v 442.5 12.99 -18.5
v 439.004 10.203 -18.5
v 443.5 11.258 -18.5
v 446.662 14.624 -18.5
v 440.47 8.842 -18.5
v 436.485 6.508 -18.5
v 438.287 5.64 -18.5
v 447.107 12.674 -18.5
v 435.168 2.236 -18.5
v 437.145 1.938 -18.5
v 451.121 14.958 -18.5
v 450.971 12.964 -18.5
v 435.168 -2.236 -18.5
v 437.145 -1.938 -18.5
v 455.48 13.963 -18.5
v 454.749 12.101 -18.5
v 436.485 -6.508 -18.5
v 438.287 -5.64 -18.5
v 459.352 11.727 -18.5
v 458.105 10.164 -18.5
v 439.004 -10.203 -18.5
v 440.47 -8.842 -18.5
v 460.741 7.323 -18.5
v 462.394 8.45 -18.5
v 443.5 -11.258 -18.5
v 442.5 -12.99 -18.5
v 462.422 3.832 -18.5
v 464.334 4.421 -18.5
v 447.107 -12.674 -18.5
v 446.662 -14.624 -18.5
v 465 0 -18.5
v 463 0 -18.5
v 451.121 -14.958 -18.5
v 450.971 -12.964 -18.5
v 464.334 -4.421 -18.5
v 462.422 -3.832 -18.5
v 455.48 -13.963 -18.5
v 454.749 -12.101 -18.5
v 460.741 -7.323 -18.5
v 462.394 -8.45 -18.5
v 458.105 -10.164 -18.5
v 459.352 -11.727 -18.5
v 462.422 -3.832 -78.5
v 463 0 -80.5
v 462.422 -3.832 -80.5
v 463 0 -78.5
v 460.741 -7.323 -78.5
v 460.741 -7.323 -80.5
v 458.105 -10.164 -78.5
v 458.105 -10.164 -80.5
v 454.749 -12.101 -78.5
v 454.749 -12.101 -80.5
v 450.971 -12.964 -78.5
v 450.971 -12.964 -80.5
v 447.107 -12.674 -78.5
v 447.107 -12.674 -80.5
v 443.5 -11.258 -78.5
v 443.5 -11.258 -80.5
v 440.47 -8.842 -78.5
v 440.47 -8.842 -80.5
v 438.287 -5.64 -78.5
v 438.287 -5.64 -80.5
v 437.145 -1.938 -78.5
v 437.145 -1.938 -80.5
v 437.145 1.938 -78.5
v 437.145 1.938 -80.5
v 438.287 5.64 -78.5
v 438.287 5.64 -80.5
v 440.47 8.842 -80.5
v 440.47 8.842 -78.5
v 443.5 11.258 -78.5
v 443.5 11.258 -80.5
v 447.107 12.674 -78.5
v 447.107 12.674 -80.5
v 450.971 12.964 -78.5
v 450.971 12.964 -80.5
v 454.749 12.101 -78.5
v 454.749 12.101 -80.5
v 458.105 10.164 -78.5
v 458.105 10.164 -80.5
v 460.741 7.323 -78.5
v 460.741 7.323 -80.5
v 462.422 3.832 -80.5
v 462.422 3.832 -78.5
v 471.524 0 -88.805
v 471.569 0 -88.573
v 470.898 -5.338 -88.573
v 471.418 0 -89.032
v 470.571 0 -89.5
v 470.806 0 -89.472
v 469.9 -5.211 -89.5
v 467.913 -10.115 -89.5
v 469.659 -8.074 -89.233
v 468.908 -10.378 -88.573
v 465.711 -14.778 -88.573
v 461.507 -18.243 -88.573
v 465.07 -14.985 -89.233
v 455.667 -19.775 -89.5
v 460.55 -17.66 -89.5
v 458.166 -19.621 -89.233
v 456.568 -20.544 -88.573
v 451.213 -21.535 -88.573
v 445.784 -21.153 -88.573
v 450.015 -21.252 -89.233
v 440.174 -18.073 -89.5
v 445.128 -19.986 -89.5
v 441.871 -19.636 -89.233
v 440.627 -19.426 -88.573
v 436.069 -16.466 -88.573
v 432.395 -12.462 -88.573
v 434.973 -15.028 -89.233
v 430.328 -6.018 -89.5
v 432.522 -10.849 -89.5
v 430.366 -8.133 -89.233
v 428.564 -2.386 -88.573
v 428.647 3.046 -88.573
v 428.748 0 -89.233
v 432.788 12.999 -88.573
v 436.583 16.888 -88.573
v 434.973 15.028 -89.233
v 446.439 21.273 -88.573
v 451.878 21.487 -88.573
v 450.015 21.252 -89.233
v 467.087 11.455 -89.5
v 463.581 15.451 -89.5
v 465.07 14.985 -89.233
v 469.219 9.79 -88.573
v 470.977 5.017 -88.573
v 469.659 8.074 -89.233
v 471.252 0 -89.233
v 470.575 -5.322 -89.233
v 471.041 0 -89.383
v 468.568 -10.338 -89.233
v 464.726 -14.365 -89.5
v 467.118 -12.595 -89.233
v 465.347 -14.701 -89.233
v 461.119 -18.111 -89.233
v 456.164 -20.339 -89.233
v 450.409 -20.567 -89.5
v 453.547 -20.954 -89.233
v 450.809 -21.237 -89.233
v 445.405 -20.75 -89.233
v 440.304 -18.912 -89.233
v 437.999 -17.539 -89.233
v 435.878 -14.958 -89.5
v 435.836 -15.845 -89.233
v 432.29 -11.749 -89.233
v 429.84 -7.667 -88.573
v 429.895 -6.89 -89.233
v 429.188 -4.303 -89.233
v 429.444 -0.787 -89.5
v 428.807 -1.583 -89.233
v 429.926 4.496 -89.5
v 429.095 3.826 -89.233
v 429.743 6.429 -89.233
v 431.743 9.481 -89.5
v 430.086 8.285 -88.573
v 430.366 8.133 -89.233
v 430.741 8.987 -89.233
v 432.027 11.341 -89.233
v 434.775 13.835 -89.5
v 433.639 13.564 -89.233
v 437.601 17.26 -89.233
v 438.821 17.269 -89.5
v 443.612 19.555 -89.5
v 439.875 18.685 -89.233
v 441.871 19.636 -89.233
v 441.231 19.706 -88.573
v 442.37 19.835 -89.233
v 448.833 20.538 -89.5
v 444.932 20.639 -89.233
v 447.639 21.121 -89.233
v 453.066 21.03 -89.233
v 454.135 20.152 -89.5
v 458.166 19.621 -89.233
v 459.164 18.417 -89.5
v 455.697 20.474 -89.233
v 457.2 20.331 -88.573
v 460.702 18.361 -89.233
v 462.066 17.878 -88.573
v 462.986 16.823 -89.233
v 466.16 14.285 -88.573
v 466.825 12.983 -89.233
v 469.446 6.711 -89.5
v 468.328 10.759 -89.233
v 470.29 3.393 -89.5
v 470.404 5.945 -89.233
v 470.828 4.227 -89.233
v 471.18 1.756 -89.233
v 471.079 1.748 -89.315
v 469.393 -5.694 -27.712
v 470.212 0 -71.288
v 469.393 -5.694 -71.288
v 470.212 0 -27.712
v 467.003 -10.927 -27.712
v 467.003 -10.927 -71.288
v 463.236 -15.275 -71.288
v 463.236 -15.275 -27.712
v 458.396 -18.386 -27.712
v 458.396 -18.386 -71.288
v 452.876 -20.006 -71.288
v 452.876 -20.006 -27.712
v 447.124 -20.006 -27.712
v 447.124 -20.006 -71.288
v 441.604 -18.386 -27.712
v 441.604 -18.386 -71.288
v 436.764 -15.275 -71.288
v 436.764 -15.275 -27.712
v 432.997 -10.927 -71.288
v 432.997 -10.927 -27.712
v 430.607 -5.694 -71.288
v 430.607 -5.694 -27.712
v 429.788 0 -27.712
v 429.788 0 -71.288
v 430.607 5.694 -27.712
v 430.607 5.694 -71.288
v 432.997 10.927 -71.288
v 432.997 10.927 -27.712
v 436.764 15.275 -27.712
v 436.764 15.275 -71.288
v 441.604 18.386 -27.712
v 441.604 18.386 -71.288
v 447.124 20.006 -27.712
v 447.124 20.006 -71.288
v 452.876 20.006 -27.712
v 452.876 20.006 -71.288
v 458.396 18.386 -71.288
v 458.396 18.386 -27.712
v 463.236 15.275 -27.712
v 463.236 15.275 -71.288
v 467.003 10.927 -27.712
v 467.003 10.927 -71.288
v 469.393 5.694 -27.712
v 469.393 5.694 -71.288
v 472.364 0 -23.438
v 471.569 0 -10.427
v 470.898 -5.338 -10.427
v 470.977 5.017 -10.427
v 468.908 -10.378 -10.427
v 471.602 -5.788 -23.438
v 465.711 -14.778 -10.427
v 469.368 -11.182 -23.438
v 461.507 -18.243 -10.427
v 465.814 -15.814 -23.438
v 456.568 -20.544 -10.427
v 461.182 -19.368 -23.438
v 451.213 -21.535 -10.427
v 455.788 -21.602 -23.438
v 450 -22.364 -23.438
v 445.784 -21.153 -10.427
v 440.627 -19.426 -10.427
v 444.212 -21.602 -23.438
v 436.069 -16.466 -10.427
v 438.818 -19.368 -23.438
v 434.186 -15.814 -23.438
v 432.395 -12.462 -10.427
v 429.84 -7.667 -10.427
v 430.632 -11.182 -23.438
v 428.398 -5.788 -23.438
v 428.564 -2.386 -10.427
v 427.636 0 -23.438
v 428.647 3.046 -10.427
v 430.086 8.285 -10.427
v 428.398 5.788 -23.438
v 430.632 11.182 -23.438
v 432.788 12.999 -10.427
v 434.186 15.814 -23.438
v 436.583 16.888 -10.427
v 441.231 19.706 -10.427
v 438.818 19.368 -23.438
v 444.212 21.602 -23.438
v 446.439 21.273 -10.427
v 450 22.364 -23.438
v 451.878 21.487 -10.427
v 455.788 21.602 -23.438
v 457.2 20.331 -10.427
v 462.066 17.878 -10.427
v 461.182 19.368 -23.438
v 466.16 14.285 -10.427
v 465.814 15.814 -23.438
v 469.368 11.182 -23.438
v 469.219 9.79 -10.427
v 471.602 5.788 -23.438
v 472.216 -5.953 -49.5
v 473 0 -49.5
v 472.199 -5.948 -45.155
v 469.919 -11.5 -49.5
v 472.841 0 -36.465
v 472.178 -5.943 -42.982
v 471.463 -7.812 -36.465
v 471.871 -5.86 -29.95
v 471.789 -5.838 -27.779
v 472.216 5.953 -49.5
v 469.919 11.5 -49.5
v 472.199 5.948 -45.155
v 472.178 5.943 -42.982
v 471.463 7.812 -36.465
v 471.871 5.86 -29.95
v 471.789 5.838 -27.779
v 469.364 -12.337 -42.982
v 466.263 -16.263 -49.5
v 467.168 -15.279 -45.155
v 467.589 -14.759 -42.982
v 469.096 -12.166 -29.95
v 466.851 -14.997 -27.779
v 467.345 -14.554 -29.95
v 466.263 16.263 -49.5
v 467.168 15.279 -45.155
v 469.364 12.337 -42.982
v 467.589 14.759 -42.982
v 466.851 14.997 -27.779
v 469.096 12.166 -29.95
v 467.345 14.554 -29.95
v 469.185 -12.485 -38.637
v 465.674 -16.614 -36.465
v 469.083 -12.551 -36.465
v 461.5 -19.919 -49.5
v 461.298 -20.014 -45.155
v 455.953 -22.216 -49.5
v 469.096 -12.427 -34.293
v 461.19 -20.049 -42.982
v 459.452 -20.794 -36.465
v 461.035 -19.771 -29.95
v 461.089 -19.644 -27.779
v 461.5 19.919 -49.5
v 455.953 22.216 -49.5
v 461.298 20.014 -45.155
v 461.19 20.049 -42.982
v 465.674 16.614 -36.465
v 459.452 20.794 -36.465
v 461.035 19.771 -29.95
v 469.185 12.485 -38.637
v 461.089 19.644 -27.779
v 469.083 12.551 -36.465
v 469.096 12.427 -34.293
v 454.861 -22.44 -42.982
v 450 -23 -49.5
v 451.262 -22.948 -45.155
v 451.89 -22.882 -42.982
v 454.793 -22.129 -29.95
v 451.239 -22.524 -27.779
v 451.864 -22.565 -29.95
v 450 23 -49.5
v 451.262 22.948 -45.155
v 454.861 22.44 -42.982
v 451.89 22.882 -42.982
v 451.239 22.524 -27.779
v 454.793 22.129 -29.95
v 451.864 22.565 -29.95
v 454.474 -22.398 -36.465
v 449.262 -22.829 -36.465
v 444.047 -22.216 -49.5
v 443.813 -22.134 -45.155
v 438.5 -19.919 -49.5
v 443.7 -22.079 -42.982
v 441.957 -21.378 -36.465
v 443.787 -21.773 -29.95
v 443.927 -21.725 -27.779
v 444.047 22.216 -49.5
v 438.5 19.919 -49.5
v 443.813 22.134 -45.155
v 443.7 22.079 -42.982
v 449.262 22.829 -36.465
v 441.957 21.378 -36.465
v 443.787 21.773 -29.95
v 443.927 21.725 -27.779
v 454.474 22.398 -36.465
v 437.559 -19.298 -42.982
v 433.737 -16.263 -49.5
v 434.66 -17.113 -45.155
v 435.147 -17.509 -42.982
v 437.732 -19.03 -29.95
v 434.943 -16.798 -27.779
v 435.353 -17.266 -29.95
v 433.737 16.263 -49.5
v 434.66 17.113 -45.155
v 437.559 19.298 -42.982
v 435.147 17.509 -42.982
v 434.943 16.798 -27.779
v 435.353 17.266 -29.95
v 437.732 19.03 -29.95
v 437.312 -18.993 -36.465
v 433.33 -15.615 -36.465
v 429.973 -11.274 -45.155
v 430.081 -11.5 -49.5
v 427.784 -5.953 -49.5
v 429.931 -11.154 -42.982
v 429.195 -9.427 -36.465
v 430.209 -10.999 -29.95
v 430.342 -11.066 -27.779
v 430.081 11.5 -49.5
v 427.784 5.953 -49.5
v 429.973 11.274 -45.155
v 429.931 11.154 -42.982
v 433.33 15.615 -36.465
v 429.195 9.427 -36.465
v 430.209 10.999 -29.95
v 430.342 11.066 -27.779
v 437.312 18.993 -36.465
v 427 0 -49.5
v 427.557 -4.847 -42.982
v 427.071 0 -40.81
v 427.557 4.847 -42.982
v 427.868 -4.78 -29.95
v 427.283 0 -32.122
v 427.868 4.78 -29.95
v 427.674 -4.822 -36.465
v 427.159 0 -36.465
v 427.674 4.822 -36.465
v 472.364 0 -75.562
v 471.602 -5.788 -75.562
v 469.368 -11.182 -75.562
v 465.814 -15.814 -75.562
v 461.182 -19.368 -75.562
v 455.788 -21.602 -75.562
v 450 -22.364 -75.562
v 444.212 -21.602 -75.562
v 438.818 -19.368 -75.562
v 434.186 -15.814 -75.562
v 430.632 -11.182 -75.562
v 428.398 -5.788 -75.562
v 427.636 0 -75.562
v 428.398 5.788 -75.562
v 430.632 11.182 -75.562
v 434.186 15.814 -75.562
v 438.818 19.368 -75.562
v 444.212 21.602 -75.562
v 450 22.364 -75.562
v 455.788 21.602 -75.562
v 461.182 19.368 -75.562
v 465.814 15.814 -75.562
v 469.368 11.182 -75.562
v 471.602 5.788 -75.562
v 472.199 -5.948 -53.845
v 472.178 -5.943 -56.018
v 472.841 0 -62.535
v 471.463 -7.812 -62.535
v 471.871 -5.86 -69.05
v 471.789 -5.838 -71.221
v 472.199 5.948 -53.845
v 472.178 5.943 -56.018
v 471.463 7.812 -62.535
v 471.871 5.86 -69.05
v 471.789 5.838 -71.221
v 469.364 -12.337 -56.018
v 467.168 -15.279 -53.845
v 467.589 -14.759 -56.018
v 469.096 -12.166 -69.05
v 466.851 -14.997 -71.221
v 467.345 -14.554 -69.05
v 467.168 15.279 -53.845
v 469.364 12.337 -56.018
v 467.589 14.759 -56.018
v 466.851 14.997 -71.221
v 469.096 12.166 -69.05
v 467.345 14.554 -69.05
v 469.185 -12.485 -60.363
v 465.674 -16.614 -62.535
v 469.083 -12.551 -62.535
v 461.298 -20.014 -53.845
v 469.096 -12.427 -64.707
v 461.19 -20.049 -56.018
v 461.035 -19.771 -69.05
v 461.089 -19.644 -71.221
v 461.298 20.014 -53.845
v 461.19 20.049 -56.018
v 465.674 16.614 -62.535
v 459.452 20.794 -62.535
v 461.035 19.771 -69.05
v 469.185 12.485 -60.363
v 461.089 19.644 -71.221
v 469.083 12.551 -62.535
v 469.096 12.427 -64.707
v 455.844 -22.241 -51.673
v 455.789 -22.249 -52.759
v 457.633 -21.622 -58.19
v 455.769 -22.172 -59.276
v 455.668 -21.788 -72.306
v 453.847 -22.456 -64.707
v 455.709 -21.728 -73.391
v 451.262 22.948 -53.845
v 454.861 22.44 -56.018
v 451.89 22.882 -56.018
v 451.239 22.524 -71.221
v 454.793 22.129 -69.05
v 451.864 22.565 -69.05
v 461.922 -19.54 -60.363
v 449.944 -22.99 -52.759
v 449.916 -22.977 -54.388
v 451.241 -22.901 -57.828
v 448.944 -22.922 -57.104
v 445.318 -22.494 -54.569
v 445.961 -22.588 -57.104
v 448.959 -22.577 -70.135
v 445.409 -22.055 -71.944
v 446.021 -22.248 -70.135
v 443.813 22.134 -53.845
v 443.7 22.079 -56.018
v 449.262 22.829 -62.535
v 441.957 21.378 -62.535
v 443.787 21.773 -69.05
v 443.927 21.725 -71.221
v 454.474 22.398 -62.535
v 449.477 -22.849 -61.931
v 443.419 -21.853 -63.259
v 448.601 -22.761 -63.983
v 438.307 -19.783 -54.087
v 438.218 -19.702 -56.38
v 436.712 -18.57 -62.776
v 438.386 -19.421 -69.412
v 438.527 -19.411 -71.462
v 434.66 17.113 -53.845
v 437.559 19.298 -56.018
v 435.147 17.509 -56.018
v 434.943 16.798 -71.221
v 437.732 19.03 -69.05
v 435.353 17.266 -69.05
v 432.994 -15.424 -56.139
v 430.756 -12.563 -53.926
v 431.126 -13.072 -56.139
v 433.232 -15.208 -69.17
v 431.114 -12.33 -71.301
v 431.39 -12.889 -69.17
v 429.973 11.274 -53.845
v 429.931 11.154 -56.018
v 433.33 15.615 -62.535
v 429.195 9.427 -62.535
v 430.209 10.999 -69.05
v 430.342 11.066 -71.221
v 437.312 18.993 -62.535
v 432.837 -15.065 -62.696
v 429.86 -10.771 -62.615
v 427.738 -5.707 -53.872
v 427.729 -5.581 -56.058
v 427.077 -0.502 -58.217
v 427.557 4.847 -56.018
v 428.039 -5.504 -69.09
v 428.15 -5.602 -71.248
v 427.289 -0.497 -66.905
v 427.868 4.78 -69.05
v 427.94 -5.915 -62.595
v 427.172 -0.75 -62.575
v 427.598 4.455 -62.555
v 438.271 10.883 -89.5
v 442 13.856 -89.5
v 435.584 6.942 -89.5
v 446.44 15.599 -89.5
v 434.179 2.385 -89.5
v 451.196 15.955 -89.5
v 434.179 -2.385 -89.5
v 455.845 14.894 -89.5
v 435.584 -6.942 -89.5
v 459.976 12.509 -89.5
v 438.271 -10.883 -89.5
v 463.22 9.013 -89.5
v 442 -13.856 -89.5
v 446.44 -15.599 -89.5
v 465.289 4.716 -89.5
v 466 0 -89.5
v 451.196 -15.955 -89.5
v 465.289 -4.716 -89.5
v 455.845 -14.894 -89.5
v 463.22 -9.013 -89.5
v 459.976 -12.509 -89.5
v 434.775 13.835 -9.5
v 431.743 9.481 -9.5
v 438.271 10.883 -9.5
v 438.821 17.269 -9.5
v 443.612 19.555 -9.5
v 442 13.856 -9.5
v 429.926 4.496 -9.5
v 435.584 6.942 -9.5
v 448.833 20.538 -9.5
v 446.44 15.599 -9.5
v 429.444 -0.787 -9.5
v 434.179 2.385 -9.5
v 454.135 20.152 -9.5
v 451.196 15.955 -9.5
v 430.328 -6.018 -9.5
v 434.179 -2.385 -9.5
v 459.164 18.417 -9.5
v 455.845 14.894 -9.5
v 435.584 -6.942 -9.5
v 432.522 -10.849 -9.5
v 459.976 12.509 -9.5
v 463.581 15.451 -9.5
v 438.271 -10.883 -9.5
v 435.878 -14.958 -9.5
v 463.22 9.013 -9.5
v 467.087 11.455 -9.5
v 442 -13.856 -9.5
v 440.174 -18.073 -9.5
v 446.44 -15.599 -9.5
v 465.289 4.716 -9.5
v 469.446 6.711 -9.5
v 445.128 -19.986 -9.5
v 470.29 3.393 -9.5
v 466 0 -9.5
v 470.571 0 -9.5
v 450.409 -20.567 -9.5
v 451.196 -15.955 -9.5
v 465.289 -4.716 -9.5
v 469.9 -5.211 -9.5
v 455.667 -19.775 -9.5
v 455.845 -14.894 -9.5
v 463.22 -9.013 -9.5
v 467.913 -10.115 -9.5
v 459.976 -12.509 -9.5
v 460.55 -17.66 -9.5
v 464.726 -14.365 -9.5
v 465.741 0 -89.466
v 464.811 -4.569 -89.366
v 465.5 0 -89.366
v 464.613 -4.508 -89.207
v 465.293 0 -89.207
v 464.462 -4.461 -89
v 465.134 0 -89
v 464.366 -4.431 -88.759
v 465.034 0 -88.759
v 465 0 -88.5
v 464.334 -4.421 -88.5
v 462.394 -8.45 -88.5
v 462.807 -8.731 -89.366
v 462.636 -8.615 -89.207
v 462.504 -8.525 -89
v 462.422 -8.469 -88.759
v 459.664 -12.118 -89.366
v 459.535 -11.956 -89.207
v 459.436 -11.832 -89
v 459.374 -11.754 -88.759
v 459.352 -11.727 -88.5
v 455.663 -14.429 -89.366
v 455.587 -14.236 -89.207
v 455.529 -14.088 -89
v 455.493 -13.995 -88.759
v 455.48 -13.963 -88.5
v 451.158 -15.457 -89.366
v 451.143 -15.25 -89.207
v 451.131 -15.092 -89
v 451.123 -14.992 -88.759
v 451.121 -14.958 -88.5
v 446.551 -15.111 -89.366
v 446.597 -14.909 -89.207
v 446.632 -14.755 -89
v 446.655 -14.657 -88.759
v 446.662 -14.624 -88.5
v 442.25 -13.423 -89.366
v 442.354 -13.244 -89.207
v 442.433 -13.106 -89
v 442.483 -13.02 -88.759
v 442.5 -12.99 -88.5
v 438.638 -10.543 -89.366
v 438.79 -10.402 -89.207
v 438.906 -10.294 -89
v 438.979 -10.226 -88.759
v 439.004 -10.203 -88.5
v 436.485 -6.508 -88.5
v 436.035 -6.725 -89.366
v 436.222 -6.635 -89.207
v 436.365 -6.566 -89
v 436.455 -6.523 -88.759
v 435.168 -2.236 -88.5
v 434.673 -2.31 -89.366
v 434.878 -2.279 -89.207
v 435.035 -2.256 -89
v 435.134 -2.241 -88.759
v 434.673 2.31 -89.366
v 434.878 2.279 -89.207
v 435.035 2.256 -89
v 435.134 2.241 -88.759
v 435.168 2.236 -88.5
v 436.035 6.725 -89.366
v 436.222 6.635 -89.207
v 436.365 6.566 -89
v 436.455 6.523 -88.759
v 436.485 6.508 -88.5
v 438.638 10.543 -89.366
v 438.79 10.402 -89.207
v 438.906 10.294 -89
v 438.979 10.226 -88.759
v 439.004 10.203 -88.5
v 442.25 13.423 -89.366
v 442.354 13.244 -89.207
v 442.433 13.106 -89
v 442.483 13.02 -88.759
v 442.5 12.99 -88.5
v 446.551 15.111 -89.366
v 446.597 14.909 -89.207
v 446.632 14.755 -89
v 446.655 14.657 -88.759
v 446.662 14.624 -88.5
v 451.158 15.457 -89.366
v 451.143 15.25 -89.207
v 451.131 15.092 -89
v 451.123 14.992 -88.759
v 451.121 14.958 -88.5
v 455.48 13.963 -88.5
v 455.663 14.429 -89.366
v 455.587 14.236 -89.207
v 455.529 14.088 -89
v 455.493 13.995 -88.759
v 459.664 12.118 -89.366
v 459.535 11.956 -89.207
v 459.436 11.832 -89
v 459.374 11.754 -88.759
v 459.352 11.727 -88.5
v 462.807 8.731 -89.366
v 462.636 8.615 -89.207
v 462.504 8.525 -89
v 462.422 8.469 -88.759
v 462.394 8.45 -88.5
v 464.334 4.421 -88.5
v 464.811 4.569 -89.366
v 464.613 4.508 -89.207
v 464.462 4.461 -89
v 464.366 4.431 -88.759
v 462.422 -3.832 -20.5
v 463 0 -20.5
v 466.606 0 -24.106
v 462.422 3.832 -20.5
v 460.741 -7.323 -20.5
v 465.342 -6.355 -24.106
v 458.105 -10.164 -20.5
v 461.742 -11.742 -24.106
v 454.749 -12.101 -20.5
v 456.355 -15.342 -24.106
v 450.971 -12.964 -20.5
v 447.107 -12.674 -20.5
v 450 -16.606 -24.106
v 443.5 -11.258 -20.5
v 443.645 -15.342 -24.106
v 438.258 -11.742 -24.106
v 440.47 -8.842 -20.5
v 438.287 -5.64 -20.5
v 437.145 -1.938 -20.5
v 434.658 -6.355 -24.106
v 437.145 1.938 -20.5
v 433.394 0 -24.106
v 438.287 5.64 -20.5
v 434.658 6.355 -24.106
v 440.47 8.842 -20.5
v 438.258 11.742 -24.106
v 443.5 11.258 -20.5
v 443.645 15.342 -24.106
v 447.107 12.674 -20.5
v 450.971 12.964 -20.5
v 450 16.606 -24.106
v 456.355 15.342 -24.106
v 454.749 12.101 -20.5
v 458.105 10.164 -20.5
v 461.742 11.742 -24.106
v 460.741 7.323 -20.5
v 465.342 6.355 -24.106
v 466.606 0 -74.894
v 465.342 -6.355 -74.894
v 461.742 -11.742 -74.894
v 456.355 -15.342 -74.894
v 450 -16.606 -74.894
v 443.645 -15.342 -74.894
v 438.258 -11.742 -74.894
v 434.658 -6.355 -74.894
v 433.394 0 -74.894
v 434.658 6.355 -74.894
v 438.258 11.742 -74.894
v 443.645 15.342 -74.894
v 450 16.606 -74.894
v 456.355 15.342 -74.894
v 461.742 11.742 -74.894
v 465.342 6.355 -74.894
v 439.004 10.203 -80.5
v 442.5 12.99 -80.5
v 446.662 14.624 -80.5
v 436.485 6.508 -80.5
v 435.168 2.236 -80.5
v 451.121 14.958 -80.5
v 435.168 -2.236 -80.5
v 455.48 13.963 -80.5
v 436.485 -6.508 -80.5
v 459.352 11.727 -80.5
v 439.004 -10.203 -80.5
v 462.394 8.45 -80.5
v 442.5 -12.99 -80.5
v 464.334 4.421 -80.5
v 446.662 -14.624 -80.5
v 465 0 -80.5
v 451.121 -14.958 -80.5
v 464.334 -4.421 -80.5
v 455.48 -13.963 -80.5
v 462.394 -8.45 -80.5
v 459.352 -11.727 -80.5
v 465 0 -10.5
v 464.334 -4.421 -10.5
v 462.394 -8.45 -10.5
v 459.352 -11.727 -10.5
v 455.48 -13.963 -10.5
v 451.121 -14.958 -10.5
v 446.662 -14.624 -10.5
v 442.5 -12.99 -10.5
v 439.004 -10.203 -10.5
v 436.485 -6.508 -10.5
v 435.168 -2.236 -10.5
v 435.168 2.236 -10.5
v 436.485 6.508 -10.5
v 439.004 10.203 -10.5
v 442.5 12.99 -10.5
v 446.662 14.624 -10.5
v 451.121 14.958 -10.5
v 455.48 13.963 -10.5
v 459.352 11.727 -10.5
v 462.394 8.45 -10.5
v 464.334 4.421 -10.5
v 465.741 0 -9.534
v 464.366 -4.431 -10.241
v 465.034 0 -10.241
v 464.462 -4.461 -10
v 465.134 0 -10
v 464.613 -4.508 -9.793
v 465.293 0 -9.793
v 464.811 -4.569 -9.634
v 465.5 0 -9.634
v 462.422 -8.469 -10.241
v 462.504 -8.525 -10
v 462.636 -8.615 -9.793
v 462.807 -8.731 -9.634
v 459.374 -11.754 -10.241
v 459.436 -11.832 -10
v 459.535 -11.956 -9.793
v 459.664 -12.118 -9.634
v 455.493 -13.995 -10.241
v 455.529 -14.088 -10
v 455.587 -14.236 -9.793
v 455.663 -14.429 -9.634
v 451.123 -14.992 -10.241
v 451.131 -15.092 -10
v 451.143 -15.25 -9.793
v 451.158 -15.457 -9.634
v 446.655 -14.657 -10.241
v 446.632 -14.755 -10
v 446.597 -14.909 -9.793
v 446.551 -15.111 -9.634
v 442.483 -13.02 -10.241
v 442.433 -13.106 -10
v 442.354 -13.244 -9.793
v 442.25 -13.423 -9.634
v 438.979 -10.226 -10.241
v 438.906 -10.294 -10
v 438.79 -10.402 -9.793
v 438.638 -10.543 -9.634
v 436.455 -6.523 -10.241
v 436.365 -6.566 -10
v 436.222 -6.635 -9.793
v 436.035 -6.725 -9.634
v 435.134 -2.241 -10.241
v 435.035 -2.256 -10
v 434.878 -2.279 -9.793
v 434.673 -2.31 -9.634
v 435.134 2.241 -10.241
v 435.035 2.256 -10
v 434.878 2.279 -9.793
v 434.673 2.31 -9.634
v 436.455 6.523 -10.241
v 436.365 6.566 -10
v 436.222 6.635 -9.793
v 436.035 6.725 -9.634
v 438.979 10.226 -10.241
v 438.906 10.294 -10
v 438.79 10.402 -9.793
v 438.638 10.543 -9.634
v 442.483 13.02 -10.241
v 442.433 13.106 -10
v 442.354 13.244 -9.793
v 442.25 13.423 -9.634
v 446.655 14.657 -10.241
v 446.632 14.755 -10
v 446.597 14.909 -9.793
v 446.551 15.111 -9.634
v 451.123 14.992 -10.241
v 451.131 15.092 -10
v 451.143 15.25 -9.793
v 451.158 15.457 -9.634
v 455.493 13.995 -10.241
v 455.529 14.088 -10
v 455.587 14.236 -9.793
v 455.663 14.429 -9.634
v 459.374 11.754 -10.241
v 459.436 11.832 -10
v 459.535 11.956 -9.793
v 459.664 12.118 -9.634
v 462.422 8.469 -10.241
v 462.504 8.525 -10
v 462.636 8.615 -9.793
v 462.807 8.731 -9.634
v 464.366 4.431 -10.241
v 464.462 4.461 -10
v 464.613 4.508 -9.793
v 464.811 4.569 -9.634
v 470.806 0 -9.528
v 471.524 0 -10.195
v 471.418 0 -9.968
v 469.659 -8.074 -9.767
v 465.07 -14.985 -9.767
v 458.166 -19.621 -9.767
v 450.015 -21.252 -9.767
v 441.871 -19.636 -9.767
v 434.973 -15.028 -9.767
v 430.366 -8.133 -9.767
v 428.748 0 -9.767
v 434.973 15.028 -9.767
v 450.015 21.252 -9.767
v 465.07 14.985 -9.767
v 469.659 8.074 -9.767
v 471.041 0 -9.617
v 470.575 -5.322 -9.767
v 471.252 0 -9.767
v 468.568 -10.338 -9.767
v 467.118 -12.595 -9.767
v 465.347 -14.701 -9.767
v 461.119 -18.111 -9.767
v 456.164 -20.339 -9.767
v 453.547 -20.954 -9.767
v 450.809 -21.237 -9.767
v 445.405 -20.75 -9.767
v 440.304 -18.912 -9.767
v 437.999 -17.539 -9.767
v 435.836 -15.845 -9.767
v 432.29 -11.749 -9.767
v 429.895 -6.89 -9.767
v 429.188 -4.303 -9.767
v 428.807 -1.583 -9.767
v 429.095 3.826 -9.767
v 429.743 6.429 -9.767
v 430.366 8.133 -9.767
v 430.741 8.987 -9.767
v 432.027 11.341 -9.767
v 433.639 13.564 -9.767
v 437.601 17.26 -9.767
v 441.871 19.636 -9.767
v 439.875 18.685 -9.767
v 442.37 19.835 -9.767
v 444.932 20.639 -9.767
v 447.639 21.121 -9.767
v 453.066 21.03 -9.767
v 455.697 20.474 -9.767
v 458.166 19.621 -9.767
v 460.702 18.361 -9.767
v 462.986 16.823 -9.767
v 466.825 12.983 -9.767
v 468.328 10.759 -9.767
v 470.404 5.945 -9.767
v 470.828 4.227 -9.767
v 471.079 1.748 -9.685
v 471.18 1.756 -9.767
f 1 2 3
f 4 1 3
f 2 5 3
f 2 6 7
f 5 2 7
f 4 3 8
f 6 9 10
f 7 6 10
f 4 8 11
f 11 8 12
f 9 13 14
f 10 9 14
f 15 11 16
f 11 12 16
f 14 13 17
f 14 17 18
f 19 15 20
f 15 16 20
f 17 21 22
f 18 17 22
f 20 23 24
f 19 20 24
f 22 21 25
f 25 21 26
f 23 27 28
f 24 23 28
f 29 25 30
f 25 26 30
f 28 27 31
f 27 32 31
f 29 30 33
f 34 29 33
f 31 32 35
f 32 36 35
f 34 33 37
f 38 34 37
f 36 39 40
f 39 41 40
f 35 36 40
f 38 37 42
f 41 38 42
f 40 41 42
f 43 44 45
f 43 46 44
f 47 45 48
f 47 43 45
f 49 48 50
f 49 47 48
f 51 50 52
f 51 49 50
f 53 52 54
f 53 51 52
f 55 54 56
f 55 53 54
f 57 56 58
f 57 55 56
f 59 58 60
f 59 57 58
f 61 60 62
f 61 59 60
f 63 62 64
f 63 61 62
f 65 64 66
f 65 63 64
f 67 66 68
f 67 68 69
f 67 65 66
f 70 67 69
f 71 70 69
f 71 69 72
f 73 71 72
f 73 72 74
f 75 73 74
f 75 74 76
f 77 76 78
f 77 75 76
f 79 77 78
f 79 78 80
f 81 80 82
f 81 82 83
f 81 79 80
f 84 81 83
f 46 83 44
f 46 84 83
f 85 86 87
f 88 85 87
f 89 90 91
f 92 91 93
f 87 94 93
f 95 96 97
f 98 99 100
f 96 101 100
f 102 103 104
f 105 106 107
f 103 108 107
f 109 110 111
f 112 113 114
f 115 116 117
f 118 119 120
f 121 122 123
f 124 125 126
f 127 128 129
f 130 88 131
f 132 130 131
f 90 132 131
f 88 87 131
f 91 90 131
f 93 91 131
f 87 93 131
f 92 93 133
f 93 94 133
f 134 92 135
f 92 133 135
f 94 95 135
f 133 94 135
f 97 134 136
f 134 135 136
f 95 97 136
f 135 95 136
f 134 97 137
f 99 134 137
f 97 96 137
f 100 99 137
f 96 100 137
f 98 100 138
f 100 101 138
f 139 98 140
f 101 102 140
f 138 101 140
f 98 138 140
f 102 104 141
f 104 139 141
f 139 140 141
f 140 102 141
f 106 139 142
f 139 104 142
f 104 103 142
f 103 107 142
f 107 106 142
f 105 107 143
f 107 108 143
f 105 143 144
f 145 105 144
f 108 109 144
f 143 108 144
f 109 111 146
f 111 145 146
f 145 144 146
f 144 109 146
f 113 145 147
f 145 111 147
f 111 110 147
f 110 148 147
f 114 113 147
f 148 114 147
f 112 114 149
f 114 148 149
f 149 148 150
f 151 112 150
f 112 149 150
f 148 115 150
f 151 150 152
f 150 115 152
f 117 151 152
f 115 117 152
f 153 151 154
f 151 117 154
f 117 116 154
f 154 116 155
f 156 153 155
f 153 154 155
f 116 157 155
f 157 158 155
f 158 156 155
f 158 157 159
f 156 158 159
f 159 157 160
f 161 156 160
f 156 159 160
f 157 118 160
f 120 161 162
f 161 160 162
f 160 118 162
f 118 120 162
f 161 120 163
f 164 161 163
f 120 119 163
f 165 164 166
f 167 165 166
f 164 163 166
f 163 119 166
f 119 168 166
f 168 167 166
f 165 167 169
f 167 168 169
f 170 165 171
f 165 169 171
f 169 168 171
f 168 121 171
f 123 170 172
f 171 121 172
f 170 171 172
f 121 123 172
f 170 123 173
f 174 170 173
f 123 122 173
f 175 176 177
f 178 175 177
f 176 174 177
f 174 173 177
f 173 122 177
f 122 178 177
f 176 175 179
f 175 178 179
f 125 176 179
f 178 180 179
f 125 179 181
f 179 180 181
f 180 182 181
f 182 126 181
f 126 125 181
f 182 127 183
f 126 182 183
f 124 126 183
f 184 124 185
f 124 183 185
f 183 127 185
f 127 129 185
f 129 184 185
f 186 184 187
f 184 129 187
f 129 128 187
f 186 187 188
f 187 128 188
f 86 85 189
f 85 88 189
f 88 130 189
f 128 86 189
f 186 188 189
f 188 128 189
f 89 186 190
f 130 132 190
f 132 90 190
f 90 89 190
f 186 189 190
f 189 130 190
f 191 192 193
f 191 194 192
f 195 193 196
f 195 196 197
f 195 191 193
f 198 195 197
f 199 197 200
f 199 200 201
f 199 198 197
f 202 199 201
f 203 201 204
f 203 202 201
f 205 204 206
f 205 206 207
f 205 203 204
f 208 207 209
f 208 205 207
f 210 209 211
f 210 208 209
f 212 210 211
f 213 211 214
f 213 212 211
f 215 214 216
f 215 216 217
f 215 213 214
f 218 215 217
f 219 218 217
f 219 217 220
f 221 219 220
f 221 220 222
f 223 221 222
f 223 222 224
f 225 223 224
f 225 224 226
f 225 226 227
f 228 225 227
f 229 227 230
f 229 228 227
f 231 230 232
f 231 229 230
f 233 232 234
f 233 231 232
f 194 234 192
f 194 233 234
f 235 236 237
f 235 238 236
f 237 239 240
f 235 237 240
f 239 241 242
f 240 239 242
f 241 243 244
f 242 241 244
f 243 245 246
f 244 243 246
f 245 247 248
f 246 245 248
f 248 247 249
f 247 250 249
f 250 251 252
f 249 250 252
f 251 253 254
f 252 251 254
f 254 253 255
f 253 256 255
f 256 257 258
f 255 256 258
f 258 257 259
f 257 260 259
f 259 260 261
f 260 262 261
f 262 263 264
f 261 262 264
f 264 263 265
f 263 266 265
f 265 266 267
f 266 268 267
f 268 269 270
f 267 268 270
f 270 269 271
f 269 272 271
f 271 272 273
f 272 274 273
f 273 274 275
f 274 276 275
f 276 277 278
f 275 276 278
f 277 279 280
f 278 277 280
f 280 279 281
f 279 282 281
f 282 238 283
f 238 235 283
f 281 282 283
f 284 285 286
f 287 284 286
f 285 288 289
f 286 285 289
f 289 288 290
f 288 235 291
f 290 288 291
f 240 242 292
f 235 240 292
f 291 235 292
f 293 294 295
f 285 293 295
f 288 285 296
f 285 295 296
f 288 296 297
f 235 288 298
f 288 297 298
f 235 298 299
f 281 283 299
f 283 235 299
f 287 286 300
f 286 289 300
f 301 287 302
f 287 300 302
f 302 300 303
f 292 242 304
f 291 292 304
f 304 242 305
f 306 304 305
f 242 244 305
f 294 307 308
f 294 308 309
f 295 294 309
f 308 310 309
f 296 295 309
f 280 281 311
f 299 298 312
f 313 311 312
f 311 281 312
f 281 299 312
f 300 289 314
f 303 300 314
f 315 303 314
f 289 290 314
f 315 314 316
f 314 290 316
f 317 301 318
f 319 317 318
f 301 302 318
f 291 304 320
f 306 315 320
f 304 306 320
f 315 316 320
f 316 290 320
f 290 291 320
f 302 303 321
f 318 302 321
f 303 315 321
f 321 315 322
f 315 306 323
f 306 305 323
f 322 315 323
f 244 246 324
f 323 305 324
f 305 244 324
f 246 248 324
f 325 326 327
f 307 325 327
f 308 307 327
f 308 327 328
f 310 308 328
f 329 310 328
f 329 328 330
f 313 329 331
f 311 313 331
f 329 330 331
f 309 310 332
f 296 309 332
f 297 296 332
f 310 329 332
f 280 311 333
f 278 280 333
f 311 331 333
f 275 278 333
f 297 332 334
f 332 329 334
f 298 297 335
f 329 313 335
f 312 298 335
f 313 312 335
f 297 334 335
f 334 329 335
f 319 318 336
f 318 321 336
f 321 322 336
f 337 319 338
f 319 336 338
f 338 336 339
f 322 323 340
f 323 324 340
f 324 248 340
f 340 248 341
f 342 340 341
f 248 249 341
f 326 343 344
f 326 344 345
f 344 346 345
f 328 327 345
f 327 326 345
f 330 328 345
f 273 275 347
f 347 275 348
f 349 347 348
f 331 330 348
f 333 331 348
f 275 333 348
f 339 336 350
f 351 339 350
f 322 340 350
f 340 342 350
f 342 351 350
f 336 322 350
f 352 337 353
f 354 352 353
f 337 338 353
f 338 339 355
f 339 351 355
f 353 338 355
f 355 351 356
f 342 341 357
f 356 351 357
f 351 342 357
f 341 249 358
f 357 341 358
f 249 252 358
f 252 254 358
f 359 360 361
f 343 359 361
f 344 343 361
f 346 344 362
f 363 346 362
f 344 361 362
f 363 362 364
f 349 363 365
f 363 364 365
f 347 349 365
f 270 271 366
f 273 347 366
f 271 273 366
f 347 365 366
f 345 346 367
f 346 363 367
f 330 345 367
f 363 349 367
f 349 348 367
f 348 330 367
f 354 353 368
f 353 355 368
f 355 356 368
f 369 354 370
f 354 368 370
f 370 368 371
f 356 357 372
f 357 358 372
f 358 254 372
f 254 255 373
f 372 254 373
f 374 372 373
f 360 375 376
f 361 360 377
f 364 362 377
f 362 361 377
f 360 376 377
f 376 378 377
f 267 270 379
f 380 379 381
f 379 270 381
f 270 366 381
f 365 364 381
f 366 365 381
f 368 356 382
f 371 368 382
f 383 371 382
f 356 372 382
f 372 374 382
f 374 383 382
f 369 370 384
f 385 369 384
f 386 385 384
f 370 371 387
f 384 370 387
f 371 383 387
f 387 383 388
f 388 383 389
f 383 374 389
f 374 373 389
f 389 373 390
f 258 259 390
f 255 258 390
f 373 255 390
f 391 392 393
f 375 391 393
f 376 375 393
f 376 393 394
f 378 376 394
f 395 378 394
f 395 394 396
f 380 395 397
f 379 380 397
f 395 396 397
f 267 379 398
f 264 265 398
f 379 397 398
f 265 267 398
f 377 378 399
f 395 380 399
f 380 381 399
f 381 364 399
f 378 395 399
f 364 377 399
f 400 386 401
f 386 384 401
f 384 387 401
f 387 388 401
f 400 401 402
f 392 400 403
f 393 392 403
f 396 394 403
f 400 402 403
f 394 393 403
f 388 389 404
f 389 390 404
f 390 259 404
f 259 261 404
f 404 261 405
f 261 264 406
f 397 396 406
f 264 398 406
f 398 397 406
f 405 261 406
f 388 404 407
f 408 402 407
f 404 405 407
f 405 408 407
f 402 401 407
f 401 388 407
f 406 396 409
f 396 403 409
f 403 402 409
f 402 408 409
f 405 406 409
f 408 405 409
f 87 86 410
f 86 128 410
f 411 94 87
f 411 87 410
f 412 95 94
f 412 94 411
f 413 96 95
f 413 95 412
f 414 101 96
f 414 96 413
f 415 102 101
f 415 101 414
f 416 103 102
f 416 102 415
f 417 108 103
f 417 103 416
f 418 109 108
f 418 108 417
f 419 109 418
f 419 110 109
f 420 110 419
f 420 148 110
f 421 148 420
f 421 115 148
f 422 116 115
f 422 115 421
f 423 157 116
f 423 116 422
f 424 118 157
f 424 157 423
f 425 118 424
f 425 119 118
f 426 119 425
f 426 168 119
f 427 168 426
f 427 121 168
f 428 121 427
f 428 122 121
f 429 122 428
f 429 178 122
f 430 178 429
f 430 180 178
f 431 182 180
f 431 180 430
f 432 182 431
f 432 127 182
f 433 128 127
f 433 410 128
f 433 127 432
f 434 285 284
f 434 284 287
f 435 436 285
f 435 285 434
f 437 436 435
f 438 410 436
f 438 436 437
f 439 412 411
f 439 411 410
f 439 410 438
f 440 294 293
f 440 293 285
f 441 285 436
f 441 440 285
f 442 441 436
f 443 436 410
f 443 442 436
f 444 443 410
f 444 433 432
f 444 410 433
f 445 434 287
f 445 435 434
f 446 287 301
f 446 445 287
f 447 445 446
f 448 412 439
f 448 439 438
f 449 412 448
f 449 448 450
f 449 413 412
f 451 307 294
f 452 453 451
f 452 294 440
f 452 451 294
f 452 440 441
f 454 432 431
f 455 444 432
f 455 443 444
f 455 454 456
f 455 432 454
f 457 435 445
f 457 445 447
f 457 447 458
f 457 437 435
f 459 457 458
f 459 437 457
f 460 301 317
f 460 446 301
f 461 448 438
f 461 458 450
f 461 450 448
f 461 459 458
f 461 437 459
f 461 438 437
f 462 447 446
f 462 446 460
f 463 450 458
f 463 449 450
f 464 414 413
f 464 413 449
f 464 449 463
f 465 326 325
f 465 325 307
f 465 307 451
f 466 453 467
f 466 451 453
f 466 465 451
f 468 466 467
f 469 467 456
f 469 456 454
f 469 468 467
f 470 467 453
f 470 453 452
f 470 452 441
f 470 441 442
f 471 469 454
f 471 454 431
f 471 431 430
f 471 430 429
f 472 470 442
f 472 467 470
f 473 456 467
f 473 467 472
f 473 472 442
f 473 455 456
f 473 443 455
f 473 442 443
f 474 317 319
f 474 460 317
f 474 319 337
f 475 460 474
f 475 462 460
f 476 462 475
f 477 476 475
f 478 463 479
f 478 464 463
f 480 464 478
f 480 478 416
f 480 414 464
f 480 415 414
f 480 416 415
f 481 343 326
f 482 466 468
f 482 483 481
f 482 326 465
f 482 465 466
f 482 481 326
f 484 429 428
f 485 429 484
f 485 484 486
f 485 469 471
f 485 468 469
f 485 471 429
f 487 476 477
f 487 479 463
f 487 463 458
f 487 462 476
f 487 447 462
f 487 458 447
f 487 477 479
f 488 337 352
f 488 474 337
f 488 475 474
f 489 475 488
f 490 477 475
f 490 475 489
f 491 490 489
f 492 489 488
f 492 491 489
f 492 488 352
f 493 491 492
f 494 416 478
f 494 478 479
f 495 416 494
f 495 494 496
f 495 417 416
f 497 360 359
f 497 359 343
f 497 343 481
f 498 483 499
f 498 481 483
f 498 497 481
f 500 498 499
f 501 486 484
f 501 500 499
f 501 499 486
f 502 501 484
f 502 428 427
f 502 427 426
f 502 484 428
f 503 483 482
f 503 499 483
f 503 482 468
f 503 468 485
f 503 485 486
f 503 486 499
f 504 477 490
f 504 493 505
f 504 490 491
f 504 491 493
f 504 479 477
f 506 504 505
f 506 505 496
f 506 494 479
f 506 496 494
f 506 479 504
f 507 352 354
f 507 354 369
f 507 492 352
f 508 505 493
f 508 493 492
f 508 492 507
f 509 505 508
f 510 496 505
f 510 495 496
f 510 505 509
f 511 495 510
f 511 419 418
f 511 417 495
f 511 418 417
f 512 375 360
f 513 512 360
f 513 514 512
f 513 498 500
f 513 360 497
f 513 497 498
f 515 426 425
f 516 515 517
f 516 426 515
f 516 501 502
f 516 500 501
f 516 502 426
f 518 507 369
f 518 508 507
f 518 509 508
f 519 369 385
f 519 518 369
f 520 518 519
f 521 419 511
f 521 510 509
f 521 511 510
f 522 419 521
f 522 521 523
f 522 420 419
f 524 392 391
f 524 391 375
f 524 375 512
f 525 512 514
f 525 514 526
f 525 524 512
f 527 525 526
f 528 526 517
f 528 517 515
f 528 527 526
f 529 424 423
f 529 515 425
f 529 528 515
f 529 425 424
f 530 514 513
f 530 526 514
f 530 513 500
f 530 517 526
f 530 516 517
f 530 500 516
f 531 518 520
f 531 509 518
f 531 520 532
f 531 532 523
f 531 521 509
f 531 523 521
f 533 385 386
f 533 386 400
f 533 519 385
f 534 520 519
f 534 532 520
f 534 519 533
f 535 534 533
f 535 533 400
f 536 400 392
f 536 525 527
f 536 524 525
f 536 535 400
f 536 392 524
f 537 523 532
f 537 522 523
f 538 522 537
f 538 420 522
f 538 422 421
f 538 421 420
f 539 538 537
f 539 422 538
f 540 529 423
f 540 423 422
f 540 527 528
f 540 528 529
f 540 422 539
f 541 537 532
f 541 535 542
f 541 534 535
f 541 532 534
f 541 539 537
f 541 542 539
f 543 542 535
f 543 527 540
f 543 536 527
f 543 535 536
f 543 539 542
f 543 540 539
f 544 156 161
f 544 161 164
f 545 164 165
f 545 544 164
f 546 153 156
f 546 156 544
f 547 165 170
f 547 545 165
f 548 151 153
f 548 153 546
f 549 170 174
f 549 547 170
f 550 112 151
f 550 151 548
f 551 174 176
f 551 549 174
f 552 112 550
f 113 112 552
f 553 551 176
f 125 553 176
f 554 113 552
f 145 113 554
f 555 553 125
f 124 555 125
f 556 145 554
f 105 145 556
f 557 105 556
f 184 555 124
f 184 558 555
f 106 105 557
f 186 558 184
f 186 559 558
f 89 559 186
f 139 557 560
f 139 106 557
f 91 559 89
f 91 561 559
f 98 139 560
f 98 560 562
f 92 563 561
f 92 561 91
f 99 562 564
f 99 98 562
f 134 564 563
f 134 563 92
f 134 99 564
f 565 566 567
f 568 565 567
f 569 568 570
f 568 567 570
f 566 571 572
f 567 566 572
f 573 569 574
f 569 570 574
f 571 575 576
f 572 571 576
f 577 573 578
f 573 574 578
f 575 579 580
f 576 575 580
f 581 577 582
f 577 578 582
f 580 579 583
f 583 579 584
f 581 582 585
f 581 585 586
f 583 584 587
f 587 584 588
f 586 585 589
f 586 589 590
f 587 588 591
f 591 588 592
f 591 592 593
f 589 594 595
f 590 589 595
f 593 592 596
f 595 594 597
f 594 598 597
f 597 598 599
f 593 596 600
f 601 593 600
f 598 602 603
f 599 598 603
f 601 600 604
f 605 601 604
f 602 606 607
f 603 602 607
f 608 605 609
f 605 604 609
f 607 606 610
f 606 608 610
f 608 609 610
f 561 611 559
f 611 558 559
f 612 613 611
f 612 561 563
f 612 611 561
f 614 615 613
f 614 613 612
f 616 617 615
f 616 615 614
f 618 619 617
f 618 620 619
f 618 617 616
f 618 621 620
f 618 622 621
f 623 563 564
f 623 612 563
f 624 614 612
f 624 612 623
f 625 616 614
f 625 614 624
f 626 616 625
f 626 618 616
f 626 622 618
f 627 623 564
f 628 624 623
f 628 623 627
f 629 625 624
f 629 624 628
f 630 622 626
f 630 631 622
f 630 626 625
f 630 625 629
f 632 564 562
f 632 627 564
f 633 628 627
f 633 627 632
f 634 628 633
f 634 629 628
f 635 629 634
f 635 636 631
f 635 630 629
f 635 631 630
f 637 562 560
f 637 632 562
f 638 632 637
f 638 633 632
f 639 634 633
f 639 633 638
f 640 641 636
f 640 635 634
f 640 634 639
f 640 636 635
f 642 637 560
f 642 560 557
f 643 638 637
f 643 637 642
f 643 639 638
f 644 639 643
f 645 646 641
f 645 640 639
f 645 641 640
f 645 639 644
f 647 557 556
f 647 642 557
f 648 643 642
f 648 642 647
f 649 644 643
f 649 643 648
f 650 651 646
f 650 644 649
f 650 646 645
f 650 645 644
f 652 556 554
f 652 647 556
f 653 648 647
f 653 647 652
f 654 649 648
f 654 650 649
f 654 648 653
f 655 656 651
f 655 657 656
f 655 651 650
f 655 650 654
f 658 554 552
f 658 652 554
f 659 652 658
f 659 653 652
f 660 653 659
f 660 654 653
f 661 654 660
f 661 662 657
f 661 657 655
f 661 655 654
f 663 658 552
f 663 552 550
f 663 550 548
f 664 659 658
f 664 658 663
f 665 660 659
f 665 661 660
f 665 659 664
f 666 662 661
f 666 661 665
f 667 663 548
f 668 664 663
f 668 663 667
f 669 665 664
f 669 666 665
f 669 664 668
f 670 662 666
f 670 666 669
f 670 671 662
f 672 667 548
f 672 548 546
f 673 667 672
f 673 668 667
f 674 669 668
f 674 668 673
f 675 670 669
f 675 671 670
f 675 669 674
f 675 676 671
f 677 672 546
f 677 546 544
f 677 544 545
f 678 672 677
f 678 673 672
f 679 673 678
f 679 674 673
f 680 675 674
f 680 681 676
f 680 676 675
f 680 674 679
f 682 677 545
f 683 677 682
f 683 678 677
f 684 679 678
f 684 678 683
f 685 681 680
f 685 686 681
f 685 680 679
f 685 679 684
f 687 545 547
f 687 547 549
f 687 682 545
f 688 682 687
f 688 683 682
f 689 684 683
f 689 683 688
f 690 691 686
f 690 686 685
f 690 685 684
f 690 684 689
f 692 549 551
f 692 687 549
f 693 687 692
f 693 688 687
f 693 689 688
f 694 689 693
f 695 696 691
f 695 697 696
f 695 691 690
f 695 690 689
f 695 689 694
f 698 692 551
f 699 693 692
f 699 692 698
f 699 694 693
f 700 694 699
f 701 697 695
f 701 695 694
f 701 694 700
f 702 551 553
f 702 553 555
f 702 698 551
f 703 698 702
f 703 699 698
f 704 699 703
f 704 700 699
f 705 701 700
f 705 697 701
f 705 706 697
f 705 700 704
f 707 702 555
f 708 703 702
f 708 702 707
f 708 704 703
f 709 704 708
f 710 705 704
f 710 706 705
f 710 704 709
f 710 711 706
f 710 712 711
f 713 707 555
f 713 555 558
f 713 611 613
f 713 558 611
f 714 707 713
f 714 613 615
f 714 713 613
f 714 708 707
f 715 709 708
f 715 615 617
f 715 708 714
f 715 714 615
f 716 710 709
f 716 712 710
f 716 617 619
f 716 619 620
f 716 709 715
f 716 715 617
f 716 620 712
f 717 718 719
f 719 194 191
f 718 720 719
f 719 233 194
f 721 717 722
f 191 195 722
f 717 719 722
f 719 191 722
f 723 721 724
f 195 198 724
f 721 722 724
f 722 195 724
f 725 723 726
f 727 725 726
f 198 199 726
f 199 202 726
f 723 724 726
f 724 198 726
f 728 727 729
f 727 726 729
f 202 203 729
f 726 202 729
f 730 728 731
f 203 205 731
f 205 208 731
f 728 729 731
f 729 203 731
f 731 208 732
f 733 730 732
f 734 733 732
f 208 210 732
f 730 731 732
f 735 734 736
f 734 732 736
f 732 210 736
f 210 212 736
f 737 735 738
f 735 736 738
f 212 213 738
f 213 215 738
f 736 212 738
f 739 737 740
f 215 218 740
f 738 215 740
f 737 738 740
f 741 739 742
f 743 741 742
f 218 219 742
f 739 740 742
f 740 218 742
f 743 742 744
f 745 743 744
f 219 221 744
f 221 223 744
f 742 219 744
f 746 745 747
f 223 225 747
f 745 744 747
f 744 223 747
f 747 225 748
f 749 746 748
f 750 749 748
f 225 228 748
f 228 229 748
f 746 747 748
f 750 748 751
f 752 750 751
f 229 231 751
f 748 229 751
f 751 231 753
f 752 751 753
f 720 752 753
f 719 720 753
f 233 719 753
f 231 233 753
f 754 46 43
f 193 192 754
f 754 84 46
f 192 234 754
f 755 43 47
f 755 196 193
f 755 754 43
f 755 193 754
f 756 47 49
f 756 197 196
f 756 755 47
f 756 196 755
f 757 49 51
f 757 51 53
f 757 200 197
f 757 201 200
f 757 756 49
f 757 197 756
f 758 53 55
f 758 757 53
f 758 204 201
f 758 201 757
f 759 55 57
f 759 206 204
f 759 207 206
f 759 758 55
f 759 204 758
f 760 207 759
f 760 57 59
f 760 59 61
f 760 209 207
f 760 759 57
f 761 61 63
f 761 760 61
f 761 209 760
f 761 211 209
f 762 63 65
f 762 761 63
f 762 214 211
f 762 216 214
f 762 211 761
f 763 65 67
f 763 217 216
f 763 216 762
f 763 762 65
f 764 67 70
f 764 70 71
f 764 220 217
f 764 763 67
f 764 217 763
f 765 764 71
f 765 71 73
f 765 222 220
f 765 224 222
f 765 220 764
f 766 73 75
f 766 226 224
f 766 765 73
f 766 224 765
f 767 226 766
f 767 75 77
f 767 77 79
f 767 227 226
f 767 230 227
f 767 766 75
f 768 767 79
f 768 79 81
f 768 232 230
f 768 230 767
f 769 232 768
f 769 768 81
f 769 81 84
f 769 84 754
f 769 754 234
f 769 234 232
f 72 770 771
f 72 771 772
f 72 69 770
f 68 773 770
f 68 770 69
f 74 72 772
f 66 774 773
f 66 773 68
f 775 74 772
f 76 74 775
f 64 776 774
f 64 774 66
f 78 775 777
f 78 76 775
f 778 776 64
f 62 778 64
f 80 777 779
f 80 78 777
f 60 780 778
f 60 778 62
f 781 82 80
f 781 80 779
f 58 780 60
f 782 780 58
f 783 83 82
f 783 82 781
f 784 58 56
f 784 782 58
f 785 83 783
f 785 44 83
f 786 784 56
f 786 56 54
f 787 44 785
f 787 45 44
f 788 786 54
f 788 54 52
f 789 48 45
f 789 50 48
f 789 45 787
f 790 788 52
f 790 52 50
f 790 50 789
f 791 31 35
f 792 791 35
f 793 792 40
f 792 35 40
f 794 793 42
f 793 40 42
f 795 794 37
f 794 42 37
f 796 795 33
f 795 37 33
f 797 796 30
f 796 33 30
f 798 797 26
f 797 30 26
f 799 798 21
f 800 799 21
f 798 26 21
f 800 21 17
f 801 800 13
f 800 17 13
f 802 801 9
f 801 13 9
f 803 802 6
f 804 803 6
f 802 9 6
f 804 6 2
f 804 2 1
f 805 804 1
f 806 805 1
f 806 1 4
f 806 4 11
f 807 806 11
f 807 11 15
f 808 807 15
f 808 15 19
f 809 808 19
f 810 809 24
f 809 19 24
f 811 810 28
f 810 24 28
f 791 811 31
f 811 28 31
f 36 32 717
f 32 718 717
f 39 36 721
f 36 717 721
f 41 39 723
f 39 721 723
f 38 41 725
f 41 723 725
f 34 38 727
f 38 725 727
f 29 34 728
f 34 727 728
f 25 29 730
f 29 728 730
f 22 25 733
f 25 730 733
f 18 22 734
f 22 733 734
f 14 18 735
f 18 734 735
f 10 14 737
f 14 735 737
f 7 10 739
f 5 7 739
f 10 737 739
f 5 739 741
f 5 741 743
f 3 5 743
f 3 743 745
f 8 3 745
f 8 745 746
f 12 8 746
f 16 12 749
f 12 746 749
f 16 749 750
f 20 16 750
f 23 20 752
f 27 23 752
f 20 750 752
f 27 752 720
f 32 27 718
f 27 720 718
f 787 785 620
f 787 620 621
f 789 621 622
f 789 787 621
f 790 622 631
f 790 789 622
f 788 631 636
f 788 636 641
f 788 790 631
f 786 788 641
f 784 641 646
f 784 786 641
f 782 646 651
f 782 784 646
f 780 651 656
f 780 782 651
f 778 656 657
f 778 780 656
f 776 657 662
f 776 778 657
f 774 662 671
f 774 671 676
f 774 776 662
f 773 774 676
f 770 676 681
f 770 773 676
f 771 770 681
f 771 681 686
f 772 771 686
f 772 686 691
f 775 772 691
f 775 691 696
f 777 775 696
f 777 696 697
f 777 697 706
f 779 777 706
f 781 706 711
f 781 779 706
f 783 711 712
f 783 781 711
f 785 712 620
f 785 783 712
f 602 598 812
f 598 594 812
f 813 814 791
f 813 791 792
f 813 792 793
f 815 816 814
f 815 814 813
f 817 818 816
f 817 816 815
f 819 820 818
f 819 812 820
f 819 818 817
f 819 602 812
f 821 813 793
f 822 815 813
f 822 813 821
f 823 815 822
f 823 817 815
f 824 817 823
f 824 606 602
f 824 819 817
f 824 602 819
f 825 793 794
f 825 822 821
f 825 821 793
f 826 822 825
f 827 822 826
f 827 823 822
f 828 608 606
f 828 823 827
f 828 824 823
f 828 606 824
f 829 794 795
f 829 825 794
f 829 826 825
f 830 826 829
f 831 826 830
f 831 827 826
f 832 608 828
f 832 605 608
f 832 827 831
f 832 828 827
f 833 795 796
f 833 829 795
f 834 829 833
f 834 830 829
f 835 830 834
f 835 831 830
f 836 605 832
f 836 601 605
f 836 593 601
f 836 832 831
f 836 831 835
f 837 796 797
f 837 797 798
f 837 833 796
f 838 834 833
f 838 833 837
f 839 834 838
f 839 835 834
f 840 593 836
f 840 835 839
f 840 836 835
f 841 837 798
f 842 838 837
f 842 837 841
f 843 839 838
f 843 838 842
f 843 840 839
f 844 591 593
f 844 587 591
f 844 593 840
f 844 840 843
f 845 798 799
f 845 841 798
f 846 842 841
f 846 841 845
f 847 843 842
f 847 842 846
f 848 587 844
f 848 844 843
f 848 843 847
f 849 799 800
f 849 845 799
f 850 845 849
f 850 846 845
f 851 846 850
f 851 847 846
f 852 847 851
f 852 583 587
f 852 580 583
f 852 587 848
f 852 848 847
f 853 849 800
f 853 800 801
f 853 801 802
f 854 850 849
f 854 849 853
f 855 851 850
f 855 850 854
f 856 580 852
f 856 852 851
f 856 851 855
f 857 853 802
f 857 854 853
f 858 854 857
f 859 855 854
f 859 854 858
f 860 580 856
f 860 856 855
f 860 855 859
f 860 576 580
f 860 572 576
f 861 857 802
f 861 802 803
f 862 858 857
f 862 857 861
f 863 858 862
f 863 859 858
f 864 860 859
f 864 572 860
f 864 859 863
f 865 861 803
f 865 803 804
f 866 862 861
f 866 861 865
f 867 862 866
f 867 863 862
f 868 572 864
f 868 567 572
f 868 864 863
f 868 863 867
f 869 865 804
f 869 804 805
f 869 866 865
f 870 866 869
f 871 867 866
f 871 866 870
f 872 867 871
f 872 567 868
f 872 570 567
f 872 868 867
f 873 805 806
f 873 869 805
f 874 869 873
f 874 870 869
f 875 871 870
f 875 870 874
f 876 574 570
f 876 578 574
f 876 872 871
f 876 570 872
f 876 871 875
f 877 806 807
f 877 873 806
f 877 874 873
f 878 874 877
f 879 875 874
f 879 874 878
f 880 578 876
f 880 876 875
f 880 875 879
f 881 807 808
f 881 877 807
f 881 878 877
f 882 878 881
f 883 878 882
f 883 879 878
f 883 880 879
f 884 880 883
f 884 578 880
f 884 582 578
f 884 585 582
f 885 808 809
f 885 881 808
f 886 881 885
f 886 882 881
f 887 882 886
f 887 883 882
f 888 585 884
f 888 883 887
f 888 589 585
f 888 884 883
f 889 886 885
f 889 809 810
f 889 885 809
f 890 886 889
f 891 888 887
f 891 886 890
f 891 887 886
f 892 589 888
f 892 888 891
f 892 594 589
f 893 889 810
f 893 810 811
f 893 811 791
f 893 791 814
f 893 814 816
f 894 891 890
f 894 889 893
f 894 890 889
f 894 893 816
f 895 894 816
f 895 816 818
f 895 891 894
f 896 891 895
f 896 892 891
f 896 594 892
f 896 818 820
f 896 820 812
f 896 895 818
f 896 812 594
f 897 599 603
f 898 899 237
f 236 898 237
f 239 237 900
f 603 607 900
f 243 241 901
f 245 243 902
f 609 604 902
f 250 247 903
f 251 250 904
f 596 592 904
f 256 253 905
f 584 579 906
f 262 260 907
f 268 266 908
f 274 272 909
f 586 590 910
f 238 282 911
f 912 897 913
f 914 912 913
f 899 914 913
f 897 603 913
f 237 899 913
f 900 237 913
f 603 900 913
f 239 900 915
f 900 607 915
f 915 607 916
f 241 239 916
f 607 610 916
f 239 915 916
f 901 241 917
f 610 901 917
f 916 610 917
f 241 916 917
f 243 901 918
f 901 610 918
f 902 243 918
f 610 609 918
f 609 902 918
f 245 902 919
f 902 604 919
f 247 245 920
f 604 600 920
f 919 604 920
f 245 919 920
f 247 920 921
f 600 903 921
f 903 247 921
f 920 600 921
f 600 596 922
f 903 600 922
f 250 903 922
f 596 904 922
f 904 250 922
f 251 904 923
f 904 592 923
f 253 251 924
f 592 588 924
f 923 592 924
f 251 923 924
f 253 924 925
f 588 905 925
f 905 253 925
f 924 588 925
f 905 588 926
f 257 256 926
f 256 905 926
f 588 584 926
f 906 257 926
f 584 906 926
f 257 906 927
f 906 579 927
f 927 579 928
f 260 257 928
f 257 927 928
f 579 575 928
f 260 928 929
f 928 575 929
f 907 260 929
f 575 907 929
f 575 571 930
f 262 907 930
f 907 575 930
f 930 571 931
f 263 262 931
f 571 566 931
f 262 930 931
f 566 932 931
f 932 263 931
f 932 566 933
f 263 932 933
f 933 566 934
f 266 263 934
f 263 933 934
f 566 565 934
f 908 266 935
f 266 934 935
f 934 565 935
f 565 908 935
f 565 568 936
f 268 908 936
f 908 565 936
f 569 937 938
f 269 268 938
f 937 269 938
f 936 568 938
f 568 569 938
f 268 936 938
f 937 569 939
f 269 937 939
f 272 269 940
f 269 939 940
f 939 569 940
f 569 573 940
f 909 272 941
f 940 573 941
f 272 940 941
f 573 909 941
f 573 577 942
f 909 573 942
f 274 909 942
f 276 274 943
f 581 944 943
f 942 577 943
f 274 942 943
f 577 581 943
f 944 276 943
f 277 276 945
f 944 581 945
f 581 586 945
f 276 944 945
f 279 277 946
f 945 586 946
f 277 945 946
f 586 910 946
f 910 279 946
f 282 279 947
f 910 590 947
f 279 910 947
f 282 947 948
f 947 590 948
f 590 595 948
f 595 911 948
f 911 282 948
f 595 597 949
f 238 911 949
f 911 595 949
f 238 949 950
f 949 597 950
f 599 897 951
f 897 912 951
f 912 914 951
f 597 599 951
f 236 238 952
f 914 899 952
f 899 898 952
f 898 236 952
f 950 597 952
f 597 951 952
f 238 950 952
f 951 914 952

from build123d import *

# Parameters (mm, degrees)
VERRUNDUNG1_R = 1


with BuildPart() as part:
    # Skizze1 → Rotation1 (revolve)
    with BuildSketch(Plane(origin=(450, 0, 0), x_dir=(0, 0, -1), z_dir=(1, 0, 0)), mode=Mode.PRIVATE) as rotation1_sk:
        with BuildLine():
            Line((27.712088496, 20.212088496), (49.5, 20.212088496))
            Line((49.5, 20.212088496), (49.5, 23))
            ThreePointArc((49.5, 23), (29.48594244, 22.624868257), (9.5, 21.5))
            Line((9.5, 21.5), (9.5, 15))
            Line((9.5, 15), (18.5, 15))
            Line((18.5, 15), (18.5, 13))
            Line((18.5, 13), (20.5, 13))
            Line((20.5, 13), (27.712088496, 20.212088496))
        make_face()
    revolve(rotation1_sk.sketch.rotate(Axis((450, 0, 0), (0, 0, -1)), 90), axis=Axis((450, 0, 0), (0, 0, -1)))

    # Spiegeln1: part across plane


with BuildPart() as part_1:
    add(part.part)
    add(part.part.mirror(Plane(origin=(450, 23, -49.5), x_dir=(1, 0, 0), z_dir=(0, 0, 1))))

    # Verrundung1
    verrundung1_edges = [part_1.edges().sort_by_distance(p)[0] for p in [
        (428.5, 0, -89.5),
        (435, 0, -89.5),
        (435, 0, -9.5),
        (428.5, 0, -9.5),
    ]]
    fillet(verrundung1_edges, radius=VERRUNDUNG1_R)


solid = part_1.part
